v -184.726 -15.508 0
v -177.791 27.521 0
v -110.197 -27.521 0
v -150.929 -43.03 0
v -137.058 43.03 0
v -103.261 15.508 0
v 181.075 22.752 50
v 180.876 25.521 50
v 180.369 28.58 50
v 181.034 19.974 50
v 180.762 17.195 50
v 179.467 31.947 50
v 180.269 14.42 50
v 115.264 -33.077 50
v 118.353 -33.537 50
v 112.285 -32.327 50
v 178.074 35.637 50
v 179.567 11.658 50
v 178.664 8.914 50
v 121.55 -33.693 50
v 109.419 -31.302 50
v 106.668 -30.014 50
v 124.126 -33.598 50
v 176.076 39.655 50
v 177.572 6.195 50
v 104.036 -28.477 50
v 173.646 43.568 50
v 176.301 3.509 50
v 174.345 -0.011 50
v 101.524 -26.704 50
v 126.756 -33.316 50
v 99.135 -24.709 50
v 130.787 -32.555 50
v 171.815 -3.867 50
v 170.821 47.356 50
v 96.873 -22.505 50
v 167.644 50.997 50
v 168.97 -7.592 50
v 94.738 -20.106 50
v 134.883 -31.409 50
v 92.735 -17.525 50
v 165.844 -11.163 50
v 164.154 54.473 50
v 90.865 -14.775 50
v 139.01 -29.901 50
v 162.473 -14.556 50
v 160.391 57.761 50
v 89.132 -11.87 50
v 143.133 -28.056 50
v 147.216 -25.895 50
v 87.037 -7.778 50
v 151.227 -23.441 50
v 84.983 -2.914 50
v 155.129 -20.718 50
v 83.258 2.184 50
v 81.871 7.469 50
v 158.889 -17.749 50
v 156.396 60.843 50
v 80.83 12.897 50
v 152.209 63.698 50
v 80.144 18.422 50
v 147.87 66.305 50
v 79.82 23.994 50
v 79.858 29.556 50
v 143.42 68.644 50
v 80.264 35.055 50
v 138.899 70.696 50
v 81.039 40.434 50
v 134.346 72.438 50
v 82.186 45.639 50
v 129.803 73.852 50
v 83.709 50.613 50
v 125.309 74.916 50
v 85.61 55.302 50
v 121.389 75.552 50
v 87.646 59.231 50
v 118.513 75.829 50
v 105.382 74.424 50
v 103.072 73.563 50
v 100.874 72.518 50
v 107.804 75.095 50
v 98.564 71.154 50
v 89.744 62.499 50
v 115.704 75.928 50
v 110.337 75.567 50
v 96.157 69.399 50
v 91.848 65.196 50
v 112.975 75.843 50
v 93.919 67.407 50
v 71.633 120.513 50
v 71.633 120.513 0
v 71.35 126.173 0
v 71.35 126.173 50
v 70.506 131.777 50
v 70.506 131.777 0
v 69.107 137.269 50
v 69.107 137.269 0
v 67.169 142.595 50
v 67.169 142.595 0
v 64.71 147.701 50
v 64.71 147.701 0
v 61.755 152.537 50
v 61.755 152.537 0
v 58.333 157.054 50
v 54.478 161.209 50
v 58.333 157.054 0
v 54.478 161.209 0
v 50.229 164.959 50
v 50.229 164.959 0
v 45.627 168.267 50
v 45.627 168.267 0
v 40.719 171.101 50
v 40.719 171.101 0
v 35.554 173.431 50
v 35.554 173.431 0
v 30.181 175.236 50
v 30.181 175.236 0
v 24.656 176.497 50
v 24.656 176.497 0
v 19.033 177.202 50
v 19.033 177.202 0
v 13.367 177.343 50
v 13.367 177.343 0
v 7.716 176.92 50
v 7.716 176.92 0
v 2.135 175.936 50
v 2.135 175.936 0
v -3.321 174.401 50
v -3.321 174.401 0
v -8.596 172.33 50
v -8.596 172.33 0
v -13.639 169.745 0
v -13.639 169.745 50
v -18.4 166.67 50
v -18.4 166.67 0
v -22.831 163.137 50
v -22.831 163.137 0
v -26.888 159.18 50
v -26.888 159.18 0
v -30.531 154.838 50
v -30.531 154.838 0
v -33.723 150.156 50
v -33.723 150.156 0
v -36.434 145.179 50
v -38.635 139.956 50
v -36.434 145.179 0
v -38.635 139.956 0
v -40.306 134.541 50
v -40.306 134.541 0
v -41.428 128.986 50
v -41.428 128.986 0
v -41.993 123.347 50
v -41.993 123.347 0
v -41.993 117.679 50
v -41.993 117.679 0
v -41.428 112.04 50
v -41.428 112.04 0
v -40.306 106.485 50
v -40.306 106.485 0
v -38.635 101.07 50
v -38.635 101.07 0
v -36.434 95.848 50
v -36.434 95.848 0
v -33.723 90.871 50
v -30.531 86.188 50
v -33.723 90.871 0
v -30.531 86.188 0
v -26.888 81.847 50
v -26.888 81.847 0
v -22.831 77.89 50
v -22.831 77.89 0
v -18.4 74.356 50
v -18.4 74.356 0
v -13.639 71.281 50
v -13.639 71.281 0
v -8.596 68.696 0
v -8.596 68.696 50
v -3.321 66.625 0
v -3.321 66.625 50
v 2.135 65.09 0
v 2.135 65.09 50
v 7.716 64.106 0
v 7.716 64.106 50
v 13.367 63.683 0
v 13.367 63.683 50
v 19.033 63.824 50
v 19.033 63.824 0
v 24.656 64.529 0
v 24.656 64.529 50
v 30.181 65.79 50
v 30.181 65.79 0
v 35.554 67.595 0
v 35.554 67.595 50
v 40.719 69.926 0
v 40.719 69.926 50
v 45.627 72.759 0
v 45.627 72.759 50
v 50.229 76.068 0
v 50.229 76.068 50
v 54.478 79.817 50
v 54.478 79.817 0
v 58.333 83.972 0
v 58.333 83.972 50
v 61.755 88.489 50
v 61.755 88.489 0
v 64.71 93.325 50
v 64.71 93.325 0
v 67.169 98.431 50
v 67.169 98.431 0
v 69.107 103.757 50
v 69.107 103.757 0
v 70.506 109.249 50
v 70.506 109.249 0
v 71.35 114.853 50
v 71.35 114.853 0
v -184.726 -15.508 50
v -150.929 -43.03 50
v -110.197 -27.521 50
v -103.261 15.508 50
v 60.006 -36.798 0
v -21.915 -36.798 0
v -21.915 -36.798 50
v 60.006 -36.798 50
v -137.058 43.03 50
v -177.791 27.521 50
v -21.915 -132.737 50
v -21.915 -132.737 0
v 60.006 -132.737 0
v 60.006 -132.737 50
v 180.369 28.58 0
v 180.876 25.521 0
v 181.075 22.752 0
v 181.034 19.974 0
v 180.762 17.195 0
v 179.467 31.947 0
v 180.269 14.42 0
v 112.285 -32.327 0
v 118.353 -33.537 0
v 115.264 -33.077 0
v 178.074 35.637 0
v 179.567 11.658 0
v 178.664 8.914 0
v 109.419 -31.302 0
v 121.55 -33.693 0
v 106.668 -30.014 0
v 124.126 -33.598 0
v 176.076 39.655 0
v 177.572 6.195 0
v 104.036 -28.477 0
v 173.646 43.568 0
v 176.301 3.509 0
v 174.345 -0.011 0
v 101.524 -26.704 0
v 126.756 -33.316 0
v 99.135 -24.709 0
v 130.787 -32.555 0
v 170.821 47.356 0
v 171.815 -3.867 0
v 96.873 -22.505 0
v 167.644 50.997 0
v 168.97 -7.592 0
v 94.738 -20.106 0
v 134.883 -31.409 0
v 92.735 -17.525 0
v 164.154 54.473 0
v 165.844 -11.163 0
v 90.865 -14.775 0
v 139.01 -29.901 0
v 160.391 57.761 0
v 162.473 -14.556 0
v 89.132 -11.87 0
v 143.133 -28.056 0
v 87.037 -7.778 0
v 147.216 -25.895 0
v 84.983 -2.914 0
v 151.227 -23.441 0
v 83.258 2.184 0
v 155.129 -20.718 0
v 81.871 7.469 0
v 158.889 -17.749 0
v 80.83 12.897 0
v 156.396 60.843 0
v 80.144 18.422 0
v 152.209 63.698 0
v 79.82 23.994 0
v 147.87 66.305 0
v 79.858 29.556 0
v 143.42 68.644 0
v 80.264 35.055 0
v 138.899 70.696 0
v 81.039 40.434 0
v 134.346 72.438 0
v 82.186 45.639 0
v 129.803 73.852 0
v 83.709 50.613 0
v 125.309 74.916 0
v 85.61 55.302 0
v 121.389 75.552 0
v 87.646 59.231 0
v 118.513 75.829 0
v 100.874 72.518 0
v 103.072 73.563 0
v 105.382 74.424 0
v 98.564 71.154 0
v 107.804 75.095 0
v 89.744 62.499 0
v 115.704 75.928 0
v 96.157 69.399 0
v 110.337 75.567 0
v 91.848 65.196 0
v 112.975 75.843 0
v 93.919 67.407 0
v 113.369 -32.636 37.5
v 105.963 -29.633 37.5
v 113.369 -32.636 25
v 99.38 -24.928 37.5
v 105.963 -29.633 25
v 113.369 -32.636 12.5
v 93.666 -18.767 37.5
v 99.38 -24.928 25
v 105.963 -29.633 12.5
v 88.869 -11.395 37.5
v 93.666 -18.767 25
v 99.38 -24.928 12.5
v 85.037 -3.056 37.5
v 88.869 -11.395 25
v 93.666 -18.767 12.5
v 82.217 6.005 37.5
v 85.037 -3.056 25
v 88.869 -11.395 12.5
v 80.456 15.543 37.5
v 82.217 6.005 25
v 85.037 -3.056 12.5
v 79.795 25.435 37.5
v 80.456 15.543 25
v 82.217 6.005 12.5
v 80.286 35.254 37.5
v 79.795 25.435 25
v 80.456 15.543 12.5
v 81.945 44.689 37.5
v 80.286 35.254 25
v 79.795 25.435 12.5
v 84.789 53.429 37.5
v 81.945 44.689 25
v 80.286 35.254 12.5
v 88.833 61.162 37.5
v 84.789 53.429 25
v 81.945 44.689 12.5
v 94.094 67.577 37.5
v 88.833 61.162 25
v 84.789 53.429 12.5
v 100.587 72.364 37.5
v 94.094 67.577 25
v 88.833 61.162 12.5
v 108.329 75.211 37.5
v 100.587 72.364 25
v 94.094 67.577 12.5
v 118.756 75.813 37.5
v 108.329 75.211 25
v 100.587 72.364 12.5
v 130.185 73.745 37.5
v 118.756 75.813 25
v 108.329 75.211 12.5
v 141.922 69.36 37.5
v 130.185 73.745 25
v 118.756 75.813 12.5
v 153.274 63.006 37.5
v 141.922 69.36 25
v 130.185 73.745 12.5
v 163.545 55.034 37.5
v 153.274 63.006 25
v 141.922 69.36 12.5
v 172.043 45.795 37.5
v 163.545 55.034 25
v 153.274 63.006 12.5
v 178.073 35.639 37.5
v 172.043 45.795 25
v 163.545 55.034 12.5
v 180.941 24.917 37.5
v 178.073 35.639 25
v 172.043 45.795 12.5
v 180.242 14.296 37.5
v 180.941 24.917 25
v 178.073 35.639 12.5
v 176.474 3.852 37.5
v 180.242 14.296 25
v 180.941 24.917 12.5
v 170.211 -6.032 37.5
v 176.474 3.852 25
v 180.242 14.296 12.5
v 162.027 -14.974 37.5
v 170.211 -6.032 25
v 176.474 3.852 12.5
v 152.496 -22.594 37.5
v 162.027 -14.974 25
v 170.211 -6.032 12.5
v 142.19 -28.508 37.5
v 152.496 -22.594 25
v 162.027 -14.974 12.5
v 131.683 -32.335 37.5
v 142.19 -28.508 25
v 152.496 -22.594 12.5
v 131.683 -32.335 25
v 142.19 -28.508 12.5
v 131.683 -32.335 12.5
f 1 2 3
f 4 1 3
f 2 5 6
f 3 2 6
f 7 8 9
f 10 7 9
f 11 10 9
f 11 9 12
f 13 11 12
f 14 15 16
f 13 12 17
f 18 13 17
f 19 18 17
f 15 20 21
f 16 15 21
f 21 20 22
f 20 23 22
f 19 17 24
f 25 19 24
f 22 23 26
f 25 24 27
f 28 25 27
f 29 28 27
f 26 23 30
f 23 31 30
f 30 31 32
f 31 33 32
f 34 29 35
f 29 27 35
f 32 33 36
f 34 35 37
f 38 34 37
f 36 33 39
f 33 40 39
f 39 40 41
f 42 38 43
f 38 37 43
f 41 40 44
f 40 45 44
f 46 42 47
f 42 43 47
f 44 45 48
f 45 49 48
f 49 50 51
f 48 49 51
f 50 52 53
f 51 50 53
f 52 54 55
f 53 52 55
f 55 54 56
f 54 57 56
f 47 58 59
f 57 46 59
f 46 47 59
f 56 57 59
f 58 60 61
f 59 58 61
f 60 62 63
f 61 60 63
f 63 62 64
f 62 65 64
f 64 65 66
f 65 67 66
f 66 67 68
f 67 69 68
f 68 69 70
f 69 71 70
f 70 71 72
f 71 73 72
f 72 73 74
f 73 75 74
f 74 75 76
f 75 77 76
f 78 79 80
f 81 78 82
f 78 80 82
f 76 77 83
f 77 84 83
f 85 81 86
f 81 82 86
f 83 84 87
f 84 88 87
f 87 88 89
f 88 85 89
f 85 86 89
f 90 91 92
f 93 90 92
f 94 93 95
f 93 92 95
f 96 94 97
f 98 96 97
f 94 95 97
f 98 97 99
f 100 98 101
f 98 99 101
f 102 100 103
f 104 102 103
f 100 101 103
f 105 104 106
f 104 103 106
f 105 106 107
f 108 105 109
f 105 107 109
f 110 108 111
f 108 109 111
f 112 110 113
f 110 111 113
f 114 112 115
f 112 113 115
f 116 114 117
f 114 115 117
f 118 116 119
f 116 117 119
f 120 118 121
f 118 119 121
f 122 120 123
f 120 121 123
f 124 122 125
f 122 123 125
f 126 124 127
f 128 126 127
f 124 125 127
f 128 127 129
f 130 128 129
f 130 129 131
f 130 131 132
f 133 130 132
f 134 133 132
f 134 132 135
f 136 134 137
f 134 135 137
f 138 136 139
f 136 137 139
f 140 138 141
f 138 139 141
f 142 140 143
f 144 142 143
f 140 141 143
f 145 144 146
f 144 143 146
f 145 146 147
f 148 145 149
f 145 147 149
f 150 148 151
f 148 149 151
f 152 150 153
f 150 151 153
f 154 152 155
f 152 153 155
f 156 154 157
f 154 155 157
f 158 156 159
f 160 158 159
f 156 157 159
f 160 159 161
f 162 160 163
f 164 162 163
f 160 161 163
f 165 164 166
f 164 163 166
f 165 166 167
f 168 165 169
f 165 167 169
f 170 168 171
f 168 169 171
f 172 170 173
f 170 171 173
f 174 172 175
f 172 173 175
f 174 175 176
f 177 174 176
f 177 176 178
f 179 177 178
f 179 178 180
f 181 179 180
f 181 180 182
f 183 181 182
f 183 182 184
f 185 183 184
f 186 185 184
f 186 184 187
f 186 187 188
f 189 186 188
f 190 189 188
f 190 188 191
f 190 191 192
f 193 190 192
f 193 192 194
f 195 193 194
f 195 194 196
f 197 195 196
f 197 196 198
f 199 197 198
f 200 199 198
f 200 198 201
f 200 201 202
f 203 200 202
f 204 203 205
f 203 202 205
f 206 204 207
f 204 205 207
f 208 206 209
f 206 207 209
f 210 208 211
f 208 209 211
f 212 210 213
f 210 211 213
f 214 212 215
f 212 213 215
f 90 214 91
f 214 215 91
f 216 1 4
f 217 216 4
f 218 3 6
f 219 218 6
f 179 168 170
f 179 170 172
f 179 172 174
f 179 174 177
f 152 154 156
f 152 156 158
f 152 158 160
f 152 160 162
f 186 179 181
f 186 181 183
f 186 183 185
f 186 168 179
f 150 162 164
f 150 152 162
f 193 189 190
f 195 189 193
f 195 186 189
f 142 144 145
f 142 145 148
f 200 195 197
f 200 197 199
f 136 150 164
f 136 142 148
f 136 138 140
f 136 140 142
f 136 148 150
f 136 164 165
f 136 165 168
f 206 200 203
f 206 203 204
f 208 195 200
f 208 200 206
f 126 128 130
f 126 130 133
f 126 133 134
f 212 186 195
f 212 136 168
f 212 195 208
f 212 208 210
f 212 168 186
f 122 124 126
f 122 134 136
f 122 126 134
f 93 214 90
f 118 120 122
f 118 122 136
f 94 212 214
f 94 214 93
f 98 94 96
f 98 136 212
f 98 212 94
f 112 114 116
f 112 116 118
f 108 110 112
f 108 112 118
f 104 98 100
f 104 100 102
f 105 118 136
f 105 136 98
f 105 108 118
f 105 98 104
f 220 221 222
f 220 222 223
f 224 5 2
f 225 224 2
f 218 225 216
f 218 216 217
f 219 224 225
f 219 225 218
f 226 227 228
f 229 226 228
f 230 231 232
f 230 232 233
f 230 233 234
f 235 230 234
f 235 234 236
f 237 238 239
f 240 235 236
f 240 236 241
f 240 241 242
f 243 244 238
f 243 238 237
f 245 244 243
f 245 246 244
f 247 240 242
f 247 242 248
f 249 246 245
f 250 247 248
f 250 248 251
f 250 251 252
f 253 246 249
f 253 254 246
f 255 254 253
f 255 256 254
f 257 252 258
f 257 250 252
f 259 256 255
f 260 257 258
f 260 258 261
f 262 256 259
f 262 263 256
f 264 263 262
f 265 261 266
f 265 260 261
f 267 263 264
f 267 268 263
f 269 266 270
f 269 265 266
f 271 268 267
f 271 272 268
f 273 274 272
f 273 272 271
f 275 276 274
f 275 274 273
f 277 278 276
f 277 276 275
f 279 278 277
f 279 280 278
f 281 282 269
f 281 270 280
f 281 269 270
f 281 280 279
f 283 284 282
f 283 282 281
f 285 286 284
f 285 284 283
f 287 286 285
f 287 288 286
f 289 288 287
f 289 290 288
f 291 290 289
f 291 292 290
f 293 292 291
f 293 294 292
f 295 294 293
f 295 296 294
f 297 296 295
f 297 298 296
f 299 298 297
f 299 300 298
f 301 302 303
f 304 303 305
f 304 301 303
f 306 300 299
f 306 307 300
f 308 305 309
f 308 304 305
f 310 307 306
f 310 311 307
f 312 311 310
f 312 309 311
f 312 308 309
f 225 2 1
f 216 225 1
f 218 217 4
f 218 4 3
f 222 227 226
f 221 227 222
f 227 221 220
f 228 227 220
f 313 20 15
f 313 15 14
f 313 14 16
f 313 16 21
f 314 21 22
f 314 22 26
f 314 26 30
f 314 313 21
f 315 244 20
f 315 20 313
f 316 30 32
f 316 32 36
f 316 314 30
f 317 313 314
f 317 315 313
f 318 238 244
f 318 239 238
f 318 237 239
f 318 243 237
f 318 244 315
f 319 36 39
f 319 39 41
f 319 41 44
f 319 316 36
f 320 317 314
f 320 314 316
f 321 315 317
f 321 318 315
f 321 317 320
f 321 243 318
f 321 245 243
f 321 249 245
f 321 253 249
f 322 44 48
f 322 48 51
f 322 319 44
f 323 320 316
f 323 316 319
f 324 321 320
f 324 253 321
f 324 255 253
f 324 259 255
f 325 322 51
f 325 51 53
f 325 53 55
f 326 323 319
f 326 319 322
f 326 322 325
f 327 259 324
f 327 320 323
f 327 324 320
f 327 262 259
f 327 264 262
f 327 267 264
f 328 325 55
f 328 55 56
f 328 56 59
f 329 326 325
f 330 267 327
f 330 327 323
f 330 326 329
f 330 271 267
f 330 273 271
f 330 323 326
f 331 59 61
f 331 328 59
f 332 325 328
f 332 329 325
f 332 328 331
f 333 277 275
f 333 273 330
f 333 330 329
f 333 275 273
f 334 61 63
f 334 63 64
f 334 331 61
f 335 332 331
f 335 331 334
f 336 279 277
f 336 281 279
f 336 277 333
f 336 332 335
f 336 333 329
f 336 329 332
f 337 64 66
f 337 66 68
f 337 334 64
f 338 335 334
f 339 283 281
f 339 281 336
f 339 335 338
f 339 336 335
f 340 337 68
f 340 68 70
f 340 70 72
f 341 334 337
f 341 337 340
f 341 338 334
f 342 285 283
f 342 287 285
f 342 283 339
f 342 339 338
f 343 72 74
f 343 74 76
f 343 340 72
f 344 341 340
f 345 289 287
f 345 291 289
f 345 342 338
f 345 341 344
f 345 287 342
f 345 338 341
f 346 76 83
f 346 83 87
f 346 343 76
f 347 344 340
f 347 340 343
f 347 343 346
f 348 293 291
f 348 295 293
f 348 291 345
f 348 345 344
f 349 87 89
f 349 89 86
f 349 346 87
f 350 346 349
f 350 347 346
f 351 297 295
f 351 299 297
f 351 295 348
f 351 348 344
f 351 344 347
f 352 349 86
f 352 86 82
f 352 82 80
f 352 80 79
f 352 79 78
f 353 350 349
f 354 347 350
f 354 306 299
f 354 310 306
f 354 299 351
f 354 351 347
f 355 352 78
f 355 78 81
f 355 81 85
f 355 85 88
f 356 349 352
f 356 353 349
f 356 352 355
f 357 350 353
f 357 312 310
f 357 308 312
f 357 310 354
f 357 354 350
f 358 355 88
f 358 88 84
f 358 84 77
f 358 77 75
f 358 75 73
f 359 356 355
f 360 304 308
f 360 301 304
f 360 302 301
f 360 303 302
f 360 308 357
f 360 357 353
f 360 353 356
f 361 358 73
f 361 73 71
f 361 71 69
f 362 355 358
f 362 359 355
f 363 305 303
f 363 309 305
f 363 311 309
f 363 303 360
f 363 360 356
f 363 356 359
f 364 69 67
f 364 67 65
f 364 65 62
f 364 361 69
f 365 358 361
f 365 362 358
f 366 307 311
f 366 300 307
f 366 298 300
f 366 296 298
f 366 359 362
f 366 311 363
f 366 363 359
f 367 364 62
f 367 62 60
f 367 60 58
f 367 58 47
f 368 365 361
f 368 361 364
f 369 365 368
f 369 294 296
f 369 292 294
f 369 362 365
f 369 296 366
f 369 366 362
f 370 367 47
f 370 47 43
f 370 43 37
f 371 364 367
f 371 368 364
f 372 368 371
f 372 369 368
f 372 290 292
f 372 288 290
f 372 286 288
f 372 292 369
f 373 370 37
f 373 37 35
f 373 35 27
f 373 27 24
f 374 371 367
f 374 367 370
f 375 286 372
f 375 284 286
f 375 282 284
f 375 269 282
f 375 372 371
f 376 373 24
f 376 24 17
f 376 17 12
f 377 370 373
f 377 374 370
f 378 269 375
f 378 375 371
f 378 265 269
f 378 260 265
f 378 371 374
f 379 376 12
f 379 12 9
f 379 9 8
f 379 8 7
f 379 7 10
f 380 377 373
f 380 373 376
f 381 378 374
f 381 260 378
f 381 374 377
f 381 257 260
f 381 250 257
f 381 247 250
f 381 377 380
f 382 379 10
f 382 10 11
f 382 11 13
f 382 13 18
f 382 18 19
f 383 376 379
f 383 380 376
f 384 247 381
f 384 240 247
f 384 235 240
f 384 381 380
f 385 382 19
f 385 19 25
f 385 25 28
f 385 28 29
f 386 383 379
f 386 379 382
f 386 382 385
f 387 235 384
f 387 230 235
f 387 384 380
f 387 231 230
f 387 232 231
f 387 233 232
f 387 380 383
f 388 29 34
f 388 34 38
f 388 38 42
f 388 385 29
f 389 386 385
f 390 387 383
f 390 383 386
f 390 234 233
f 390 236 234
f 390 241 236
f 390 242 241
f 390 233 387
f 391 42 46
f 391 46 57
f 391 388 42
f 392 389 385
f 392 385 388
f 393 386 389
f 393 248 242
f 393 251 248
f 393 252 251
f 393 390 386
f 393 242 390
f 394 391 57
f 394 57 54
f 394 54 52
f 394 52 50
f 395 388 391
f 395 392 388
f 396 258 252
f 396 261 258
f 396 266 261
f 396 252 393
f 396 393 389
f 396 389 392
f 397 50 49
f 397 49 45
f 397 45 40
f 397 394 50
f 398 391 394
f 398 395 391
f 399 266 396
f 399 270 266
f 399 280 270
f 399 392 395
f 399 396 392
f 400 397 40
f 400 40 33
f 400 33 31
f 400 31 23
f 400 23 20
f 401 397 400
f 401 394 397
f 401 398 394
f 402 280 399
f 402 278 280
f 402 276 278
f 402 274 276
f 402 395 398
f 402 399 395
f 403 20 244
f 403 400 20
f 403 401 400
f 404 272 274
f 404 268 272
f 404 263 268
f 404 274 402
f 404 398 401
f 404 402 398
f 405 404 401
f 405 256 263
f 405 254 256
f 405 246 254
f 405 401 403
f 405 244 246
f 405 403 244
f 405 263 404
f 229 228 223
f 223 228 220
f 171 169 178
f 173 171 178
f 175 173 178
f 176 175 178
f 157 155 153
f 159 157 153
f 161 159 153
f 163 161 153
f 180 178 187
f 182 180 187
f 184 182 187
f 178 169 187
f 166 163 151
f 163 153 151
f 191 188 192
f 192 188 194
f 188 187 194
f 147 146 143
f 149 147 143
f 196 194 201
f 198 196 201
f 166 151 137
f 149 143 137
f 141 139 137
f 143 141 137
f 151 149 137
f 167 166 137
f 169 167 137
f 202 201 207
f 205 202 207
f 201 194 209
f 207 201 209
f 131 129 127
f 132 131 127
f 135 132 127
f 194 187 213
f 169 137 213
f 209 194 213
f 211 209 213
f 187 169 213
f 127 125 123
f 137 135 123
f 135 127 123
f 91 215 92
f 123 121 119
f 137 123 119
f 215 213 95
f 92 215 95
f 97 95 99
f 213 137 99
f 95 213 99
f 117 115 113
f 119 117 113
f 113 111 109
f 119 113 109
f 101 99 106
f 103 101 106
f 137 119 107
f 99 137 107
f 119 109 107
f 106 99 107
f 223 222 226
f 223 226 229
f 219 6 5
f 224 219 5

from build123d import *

# Parameters (mm, degrees)
F0_W     = 81.9210670888
F0_H     = 95.9388315678
F1_DEPTH = 50
F0_R     = 56.8480436044


with BuildPart() as f1:
    # F0 (on Top) → F1 (new body)
    with BuildSketch(Plane.XY):
        with Locations((19.0459471196, -84.7671031952)):
            Rectangle(F0_W, F0_H)
    extrude(amount=F1_DEPTH)


with BuildPart() as f1b:
    # F0 (on Top) → F1, piece 2 (new body)
    with BuildSketch(Plane.XY):
        Polygon((-137.058035258, 43.029590546), (-177.7905367577, 27.5211715709), (-184.7261027027, -15.508418975), (-150.9291671479, -43.029590546), (-110.1966656482, -27.5211715709), (-103.2610997032, 15.508418975), align=None)
    extrude(amount=F1_DEPTH)


with BuildPart() as f1c:
    # F0 (on Top) → F1, piece 3 (new body)
    with BuildSketch(Plane.XY):
        with Locations((14.784630388, 120.5130964518)):
            Circle(F0_R)
    extrude(amount=F1_DEPTH)


with BuildPart() as f1d:
    # F0 (on Top) → F1, piece 4 (new body)
    with BuildSketch(Plane.XY):
        with BuildLine():
            add(Edge.make_bspline(
                [(121.549770236, -33.6934439838), (98.7427414444, -33.6862516465), (68.4516865063, 13.3790130373), (96.238000525, 103.7690899159), (220.8345364058, 27.9702259035), (147.5645628182, -33.7016479092), (121.549770236, -33.6934439838)],
                knots=[0, 0, 0, 0, 0.2310760784, 0.465237736, 0.7364235252, 1, 1, 1, 1], degree=3))
        make_face()
    extrude(amount=F1_DEPTH)


solid = Compound([f1.part, f1b.part, f1c.part, f1d.part])
